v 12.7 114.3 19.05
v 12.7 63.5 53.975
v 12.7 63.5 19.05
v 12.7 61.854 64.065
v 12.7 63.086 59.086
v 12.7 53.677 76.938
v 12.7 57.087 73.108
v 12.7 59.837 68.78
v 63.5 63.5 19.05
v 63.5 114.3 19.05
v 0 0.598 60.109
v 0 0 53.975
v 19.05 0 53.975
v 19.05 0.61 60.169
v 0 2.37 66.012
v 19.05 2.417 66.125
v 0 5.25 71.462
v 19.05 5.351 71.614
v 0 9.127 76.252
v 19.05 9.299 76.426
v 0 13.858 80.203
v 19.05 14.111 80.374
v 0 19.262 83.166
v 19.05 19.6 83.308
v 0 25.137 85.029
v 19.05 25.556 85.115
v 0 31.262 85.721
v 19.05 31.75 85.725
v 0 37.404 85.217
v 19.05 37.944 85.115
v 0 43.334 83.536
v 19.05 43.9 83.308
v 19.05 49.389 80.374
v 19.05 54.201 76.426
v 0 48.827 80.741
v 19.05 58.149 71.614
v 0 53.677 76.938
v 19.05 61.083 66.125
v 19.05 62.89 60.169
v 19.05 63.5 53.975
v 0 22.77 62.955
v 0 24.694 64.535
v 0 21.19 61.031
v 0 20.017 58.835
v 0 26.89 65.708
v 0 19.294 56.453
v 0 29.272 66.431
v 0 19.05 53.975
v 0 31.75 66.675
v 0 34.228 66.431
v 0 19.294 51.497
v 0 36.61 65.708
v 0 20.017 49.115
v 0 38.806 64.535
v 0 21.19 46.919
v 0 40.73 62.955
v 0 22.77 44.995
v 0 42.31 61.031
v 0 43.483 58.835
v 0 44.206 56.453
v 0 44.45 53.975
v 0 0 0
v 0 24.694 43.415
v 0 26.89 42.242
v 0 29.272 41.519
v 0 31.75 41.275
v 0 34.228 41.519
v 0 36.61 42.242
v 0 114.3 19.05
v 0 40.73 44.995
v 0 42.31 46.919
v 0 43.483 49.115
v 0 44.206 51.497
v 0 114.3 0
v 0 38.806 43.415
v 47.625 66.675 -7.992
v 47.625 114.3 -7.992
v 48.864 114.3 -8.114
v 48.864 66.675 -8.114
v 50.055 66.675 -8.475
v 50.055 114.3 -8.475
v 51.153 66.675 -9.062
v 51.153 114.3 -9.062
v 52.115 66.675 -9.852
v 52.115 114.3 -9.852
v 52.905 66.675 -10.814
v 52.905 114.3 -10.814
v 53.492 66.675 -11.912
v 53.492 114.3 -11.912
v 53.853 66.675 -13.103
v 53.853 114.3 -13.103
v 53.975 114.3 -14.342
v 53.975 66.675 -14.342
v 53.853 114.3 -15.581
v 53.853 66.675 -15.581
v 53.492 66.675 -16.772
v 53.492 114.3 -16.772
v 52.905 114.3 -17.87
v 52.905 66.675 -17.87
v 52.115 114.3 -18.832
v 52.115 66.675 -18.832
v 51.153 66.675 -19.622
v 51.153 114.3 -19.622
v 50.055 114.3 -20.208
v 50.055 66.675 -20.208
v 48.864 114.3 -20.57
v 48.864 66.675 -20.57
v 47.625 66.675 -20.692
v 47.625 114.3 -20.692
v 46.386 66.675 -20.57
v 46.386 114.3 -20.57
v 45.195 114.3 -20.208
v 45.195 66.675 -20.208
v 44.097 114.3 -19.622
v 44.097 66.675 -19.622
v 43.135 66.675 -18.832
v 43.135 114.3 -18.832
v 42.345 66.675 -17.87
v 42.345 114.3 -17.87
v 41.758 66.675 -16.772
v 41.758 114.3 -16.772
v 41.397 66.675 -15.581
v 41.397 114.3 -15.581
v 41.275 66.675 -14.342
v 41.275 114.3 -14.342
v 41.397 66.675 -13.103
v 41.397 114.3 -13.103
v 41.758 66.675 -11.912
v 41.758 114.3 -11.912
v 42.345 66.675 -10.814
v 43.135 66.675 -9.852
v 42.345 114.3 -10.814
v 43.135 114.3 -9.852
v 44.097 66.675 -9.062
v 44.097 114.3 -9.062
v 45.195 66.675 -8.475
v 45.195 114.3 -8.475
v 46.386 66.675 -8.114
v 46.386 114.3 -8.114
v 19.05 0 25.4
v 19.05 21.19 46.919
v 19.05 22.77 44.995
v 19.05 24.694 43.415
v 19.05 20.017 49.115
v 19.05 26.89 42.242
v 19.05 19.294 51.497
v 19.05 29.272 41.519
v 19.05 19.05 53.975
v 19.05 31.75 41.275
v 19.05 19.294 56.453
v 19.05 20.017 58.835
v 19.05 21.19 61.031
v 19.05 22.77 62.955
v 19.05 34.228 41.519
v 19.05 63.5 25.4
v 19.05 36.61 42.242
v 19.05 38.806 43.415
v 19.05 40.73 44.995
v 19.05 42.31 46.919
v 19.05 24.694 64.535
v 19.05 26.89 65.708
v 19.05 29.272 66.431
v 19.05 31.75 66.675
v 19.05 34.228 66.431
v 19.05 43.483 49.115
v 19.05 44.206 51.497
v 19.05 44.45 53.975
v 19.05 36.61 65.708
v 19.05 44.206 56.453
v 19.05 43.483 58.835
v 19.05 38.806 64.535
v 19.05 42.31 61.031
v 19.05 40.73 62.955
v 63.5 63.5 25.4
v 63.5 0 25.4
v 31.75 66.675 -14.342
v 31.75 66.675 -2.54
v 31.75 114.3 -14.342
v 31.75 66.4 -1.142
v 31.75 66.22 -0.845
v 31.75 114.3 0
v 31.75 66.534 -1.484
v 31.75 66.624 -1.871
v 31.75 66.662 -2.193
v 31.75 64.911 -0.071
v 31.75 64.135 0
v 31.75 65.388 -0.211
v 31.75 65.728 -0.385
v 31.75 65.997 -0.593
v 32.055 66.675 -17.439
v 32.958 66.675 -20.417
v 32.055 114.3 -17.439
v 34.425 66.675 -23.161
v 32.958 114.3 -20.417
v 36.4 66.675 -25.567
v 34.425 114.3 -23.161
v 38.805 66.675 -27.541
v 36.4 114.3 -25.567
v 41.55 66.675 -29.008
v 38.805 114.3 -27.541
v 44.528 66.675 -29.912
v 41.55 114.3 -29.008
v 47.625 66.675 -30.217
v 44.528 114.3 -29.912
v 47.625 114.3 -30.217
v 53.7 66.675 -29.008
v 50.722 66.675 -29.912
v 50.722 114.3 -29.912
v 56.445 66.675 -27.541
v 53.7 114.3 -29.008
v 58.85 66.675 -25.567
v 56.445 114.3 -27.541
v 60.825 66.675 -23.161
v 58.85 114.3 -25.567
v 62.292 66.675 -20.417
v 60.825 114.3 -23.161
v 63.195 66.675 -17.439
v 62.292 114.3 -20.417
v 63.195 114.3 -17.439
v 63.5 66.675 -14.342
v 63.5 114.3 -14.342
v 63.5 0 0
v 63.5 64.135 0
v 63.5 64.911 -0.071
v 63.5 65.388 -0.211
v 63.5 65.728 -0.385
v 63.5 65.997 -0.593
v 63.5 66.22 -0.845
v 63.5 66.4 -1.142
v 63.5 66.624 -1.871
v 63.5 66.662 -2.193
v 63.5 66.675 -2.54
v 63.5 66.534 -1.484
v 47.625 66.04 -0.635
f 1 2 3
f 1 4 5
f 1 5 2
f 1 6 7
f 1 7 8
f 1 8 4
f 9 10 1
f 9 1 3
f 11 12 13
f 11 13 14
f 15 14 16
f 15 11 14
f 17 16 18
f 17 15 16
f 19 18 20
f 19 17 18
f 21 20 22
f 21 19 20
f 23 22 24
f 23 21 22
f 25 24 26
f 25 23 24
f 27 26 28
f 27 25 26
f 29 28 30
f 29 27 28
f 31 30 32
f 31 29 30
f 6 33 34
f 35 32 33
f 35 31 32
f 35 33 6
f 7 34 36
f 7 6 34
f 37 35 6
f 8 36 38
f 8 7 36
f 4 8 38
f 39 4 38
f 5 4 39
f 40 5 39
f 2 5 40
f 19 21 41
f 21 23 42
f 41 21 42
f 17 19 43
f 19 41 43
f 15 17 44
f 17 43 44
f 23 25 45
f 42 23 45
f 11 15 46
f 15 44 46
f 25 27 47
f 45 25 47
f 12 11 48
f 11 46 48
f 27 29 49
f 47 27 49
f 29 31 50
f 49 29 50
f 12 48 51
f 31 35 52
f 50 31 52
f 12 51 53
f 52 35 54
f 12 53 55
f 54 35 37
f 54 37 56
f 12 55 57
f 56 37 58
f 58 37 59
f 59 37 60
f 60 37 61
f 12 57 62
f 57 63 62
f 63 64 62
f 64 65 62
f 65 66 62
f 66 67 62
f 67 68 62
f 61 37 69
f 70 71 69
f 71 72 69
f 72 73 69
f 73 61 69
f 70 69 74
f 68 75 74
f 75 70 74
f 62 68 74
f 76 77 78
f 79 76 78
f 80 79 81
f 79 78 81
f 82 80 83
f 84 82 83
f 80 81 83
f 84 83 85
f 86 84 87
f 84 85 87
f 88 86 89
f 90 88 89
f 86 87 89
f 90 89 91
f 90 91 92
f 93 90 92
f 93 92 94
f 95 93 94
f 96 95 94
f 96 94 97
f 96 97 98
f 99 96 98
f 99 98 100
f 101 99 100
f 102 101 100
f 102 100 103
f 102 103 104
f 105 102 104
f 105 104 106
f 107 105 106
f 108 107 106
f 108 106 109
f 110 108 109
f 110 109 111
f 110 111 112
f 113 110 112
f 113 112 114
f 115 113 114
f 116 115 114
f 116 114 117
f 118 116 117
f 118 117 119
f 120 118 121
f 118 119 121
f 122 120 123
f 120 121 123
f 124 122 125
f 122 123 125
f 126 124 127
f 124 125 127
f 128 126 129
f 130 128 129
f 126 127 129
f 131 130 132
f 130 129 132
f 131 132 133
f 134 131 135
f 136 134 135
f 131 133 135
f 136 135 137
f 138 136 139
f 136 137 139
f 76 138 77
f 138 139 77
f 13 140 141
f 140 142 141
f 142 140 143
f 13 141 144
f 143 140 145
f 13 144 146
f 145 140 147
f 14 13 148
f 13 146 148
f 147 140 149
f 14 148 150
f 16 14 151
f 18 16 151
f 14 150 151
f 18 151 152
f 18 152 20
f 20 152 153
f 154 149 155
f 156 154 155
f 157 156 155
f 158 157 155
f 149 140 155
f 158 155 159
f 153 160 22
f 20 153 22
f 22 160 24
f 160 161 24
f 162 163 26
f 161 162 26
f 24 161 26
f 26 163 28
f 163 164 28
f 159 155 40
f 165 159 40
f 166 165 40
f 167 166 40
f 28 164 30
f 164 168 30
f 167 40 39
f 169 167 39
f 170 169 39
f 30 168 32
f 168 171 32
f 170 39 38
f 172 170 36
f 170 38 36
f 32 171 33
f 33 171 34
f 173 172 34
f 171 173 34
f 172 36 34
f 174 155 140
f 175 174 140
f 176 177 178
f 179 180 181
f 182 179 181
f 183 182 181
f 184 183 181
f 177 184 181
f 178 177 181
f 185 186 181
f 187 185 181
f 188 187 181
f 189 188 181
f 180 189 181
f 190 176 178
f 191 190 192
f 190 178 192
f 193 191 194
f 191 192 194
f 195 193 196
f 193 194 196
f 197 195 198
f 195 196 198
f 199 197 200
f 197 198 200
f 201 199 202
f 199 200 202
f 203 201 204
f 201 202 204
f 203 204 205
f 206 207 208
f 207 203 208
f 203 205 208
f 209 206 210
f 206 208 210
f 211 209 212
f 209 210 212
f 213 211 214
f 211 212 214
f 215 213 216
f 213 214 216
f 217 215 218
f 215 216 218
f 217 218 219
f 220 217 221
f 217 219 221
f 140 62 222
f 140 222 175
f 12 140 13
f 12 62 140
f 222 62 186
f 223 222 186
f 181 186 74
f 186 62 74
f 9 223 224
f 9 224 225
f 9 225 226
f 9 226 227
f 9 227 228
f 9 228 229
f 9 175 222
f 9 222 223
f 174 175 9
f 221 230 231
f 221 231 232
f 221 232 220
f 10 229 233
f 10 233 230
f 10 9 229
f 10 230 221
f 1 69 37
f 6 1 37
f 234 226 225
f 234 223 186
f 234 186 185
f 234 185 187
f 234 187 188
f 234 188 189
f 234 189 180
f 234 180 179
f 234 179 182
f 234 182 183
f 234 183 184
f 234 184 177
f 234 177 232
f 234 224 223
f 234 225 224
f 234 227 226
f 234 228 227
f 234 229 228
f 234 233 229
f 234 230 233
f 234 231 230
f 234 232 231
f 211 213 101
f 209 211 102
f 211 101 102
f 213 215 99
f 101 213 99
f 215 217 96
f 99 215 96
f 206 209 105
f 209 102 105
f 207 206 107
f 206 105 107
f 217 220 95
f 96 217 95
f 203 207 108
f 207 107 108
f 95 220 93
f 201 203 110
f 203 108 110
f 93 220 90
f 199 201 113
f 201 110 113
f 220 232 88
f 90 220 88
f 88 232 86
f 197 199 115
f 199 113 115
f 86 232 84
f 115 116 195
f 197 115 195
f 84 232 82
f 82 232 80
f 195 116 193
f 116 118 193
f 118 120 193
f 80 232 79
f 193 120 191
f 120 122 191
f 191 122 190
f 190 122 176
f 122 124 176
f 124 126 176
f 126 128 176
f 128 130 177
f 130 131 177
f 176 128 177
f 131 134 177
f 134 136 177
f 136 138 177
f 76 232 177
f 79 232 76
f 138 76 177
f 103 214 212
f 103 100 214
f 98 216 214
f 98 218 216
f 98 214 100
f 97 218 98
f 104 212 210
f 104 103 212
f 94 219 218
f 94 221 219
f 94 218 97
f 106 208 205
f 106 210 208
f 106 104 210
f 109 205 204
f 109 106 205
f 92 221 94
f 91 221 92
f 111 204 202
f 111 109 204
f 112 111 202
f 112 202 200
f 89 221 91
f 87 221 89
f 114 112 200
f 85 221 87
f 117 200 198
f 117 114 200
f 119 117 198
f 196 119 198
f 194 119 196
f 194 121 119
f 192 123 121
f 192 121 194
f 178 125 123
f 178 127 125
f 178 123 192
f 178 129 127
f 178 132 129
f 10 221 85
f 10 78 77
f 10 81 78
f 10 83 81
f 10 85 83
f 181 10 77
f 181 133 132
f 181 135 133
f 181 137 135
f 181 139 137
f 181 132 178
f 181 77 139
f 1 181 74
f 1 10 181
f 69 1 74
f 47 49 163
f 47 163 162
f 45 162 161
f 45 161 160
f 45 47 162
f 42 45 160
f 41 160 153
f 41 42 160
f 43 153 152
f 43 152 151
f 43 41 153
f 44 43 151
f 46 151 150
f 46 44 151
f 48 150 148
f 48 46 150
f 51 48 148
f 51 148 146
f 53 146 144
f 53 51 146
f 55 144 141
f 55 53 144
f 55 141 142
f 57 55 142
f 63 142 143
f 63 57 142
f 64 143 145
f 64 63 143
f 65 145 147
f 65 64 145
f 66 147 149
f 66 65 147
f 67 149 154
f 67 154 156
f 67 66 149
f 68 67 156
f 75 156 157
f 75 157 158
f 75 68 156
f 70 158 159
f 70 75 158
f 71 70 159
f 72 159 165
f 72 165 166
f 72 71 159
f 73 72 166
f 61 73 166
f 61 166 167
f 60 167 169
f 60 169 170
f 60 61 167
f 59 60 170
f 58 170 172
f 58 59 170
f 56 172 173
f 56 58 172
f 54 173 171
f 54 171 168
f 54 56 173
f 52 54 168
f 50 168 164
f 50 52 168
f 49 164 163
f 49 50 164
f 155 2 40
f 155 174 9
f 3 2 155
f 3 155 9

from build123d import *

# Parameters (mm, degrees)
BOSS_EXTRUDE1_DEPTH = 63.5
SKETCH1_3_R         = 12.7
BOSS_EXTRUDE2_DEPTH = 19.05
BOSS_EXTRUDE3_DEPTH = 12.7
SKETCH2_W           = 31.75
SKETCH2_H           = 47.625
BOSS_EXTRUDE4_DEPTH = 31.75
SKETCH3_R           = 6.35
CUT_EXTRUDE1_DEPTH  = 157.350617604
FILLET1_SIZE        = 2.54


with BuildPart() as part:
    # Sketch1 → Boss-Extrude1 (new body)
    with BuildSketch(Plane(origin=(0, 0, 0), x_dir=(0, 0, -1), z_dir=(1, 0, 0))):
        Polygon((0, 0), (0, 114.3), (-19.05, 114.3), (-19.05, 63.5), (-25.4, 63.5), (-25.4, 0), align=None)
    extrude(amount=BOSS_EXTRUDE1_DEPTH)

    # Sketch1<3> → Boss-Extrude2 (add)
    with BuildSketch(Plane(origin=(0, 0, 0), x_dir=(0, 0, -1), z_dir=(1, 0, 0))):
        with BuildLine():
            Line((-53.975, 63.5), (-25.4, 63.5))
            Line((-25.4, 63.5), (-25.4, 0))
            Line((-25.4, 0), (-53.975, 0))
            ThreePointArc((-53.975, 0), (-85.725, 31.75), (-53.975, 63.5))
        make_face()
        with Locations(Location((-53.975, 31.75, 0), (0, 0, 180))):
            Circle(SKETCH1_3_R, mode=Mode.SUBTRACT)
    extrude(amount=BOSS_EXTRUDE2_DEPTH)

    # Sketch1<4> → Boss-Extrude3 (add)
    with BuildSketch(Plane(origin=(0, 0, 0), x_dir=(0, 0, -1), z_dir=(1, 0, 0))):
        with BuildLine():
            Line((-53.975, 63.5), (-25.4, 63.5))
            Line((-25.4, 63.5), (-19.05, 63.5))
            Line((-19.05, 63.5), (-19.05, 114.3))
            Line((-19.05, 114.3), (-76.937767089, 53.676555307))
            ThreePointArc((-76.937767089, 53.676555307), (-66.462881506, 60.941014294), (-53.975, 63.5))
        make_face()
    extrude(amount=BOSS_EXTRUDE3_DEPTH)

    # Sketch2 → Boss-Extrude4 (add)
    with BuildSketch(Plane(origin=(0, 0, 0), x_dir=(-1, 0, 0), z_dir=(0, 0, -1))):
        with Locations((-47.625, 90.4875)):
            Rectangle(SKETCH2_W, SKETCH2_H)
    extrude(amount=BOSS_EXTRUDE4_DEPTH)

    # Sketch3 → Cut-Extrude1 (cut, through all)
    with BuildSketch(Plane(origin=(0, 114.3, 0), x_dir=(1, 0, 0), z_dir=(0, 1, 0))):
        with BuildLine():
            Line((31.75, 31.75), (31.75, 14.341708261))
            ThreePointArc((31.75, 14.341708261), (47.625, 30.216708261), (63.5, 14.341708261))
            Line((63.5, 14.341708261), (63.5, 31.75))
            Line((63.5, 31.75), (31.75, 31.75))
        make_face()
        with Locations(Location((47.625, 14.341708261, 0), (0, 0, 270))):
            Circle(SKETCH3_R)
    extrude(amount=-CUT_EXTRUDE1_DEPTH, mode=Mode.SUBTRACT)

    # Fillet1
    # a fillet whose section is not a circle: 2.54 mm, written as the material it adds along each edge
    with BuildSketch(Plane(origin=(63.5, 66.675, 0), x_dir=(0, -1, 0), z_dir=(-1, 0, 0))) as fillet1_piece_1:
        with BuildLine():
            Bezier((FILLET1_SIZE, 0), (0, 0), (0, -FILLET1_SIZE), weights=[1, 1, 1])
            Line((0, -FILLET1_SIZE), (0, 0))
            Line((0, 0), (FILLET1_SIZE, 0))
        make_face()
    extrude(amount=31.75)


solid = part.part
